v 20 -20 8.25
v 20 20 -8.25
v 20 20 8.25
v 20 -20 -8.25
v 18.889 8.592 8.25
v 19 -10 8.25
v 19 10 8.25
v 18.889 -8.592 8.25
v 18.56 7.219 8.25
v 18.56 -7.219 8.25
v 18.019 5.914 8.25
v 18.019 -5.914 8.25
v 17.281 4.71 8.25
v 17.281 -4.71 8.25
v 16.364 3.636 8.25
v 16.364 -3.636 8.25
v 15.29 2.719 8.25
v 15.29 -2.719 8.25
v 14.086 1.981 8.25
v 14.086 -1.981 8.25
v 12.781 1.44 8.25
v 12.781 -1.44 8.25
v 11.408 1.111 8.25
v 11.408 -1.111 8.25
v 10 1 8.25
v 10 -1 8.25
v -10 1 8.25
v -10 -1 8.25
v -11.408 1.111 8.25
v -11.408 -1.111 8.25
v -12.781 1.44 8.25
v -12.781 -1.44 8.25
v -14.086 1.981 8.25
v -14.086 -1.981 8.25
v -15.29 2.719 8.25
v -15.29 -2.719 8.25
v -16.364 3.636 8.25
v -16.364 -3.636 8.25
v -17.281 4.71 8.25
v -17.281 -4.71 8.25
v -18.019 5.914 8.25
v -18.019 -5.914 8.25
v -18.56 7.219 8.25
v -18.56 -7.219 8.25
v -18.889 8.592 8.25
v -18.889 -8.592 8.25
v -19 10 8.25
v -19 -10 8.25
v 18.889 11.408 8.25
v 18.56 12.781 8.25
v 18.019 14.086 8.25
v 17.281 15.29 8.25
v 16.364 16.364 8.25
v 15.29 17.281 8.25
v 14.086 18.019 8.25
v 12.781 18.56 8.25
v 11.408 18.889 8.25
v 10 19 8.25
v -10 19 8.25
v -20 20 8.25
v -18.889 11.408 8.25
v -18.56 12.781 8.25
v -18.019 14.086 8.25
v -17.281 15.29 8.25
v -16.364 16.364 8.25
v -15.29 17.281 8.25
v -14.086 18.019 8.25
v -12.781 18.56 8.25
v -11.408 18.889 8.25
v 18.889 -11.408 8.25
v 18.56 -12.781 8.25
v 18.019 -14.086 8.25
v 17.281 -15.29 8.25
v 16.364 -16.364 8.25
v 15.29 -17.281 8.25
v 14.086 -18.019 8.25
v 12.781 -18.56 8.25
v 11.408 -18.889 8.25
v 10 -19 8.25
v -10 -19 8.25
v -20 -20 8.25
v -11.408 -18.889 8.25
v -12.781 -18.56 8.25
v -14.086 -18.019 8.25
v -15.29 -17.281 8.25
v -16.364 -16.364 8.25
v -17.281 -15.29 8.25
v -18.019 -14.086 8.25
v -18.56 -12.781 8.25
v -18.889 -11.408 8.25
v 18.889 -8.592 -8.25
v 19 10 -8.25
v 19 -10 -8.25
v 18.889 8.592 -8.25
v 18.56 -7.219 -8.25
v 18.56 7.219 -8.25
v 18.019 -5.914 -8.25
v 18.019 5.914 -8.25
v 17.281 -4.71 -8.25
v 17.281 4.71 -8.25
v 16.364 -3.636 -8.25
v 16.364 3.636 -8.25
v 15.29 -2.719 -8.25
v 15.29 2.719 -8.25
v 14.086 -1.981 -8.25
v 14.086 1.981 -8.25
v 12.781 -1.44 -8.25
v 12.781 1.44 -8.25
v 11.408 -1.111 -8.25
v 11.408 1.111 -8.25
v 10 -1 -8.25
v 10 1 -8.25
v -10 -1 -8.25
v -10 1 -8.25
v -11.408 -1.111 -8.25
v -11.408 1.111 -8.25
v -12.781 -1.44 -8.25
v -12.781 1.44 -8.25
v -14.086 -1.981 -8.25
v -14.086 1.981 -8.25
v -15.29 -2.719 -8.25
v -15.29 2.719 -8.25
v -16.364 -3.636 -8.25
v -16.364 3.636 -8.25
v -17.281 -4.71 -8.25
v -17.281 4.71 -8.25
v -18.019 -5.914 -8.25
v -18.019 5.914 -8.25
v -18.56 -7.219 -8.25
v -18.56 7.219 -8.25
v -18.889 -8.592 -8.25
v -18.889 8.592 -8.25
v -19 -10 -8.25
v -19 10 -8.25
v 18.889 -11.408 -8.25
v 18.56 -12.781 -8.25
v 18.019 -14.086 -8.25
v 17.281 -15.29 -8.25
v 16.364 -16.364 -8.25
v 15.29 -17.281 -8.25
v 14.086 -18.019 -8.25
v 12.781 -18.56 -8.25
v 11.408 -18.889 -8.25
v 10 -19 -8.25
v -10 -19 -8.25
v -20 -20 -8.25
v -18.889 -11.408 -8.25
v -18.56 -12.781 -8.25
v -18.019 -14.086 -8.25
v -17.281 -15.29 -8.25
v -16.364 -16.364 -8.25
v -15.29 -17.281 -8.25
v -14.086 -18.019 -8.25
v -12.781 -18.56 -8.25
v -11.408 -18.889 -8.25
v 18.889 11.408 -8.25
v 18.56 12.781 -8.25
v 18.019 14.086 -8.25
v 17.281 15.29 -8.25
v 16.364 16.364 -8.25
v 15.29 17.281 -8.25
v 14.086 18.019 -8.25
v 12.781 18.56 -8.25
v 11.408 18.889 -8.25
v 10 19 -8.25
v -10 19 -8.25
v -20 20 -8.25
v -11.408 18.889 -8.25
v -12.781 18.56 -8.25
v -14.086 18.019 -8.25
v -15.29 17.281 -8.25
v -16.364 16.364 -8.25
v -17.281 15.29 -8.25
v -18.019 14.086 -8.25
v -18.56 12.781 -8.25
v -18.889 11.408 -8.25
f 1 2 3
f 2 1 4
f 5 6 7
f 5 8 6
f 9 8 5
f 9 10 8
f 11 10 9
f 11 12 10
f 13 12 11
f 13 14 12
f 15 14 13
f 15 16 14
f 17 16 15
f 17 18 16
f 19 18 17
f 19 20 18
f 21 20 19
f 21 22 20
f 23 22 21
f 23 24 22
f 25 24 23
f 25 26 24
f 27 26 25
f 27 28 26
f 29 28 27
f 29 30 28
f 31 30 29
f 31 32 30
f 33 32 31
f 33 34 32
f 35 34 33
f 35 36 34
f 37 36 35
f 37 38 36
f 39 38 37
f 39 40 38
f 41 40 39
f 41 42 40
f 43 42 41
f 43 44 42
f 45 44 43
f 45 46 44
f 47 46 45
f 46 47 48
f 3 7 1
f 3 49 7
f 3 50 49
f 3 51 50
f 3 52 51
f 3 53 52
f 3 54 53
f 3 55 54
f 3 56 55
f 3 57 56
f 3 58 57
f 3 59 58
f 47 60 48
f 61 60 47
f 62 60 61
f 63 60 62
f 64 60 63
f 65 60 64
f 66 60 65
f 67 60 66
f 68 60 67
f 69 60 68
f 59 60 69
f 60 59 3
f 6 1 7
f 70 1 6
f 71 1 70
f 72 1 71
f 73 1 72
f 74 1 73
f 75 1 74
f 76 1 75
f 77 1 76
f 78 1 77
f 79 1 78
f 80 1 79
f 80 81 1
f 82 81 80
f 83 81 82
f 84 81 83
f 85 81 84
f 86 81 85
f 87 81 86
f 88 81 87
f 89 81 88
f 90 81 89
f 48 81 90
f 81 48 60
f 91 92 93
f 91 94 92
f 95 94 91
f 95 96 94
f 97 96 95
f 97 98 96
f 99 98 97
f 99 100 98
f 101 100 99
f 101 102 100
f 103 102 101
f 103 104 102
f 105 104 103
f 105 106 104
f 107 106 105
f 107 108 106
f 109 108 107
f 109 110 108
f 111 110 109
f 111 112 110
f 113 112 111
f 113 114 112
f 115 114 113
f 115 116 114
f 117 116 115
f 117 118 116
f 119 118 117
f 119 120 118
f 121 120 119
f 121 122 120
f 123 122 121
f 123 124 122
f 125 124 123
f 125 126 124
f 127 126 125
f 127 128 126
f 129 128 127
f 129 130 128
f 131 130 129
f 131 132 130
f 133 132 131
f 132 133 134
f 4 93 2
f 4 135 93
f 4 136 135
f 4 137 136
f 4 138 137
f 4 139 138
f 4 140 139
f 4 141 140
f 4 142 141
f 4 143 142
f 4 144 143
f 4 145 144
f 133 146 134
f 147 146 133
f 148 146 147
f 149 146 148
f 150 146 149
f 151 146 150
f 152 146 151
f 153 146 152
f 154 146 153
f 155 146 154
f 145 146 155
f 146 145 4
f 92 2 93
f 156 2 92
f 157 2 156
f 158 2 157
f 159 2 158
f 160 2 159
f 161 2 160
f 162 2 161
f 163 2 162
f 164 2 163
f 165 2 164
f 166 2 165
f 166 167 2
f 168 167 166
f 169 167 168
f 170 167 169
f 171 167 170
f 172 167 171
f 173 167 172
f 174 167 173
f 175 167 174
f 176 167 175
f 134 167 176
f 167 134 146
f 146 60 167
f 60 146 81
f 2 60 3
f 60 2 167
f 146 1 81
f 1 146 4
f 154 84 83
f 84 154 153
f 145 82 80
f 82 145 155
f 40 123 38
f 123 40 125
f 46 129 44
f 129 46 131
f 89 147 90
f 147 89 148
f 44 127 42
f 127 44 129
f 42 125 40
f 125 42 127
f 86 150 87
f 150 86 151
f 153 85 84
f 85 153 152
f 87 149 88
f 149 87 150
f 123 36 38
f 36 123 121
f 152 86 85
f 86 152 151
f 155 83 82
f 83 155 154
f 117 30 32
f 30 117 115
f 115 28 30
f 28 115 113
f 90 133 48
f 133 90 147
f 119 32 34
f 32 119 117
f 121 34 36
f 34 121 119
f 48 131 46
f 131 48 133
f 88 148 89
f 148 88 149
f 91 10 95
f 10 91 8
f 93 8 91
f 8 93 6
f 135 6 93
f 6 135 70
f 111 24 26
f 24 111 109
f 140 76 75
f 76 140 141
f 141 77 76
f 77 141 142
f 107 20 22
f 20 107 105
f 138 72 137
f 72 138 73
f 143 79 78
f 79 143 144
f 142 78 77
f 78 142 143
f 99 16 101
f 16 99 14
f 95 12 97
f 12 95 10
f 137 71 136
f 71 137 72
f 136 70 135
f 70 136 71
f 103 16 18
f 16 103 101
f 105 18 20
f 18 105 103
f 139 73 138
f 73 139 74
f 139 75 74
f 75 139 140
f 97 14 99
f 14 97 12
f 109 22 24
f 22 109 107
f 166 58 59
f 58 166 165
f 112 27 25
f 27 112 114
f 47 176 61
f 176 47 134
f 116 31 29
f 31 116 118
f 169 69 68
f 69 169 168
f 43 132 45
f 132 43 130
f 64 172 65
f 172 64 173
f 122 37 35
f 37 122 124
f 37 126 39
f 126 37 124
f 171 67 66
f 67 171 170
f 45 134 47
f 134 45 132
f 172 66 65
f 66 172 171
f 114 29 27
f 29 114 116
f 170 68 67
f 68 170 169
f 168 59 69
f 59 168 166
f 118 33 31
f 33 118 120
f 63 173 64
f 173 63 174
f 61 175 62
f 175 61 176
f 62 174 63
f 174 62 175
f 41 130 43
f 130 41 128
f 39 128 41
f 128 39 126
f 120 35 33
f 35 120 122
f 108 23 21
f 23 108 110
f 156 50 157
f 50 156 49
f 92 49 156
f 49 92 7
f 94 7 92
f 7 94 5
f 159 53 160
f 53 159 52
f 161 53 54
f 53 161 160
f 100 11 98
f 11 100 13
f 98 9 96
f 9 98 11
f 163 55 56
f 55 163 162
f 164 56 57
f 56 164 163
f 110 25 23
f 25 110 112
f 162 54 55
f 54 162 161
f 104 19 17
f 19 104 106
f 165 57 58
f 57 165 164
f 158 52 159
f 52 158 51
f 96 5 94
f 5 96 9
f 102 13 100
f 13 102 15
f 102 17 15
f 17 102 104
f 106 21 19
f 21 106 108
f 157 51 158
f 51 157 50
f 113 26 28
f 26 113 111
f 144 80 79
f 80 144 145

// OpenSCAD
$fn = 40;

module cabletile(x=38,y=38,z=16.5) {
  overextrusion = 0.2;
  pin_thickness = 1.5 + 2 * overextrusion;
  pin_width = 6.5 + 2 * overextrusion;
  pin_length = 16.5;
  newZ=max(z,pin_length);
  difference() {
    cube([x,y,newZ],center=true);
    translate([-10,-10,0])
      cylinder(r=9,h=newZ,center=true);
    translate([10,-10,0])
      cylinder(r=9,h=newZ,center=true);
    translate([0,10,0])
      cube([20,18,newZ],center=true);

    translate([-10,10,0])
      cylinder(r=9,h=newZ,center=true);
    translate([10,10,0])
      cylinder(r=9,h=newZ,center=true);
    translate([0,-10,0])
      cube([20,18,newZ],center=true);

 }
}

cabletile(40,40,0);
